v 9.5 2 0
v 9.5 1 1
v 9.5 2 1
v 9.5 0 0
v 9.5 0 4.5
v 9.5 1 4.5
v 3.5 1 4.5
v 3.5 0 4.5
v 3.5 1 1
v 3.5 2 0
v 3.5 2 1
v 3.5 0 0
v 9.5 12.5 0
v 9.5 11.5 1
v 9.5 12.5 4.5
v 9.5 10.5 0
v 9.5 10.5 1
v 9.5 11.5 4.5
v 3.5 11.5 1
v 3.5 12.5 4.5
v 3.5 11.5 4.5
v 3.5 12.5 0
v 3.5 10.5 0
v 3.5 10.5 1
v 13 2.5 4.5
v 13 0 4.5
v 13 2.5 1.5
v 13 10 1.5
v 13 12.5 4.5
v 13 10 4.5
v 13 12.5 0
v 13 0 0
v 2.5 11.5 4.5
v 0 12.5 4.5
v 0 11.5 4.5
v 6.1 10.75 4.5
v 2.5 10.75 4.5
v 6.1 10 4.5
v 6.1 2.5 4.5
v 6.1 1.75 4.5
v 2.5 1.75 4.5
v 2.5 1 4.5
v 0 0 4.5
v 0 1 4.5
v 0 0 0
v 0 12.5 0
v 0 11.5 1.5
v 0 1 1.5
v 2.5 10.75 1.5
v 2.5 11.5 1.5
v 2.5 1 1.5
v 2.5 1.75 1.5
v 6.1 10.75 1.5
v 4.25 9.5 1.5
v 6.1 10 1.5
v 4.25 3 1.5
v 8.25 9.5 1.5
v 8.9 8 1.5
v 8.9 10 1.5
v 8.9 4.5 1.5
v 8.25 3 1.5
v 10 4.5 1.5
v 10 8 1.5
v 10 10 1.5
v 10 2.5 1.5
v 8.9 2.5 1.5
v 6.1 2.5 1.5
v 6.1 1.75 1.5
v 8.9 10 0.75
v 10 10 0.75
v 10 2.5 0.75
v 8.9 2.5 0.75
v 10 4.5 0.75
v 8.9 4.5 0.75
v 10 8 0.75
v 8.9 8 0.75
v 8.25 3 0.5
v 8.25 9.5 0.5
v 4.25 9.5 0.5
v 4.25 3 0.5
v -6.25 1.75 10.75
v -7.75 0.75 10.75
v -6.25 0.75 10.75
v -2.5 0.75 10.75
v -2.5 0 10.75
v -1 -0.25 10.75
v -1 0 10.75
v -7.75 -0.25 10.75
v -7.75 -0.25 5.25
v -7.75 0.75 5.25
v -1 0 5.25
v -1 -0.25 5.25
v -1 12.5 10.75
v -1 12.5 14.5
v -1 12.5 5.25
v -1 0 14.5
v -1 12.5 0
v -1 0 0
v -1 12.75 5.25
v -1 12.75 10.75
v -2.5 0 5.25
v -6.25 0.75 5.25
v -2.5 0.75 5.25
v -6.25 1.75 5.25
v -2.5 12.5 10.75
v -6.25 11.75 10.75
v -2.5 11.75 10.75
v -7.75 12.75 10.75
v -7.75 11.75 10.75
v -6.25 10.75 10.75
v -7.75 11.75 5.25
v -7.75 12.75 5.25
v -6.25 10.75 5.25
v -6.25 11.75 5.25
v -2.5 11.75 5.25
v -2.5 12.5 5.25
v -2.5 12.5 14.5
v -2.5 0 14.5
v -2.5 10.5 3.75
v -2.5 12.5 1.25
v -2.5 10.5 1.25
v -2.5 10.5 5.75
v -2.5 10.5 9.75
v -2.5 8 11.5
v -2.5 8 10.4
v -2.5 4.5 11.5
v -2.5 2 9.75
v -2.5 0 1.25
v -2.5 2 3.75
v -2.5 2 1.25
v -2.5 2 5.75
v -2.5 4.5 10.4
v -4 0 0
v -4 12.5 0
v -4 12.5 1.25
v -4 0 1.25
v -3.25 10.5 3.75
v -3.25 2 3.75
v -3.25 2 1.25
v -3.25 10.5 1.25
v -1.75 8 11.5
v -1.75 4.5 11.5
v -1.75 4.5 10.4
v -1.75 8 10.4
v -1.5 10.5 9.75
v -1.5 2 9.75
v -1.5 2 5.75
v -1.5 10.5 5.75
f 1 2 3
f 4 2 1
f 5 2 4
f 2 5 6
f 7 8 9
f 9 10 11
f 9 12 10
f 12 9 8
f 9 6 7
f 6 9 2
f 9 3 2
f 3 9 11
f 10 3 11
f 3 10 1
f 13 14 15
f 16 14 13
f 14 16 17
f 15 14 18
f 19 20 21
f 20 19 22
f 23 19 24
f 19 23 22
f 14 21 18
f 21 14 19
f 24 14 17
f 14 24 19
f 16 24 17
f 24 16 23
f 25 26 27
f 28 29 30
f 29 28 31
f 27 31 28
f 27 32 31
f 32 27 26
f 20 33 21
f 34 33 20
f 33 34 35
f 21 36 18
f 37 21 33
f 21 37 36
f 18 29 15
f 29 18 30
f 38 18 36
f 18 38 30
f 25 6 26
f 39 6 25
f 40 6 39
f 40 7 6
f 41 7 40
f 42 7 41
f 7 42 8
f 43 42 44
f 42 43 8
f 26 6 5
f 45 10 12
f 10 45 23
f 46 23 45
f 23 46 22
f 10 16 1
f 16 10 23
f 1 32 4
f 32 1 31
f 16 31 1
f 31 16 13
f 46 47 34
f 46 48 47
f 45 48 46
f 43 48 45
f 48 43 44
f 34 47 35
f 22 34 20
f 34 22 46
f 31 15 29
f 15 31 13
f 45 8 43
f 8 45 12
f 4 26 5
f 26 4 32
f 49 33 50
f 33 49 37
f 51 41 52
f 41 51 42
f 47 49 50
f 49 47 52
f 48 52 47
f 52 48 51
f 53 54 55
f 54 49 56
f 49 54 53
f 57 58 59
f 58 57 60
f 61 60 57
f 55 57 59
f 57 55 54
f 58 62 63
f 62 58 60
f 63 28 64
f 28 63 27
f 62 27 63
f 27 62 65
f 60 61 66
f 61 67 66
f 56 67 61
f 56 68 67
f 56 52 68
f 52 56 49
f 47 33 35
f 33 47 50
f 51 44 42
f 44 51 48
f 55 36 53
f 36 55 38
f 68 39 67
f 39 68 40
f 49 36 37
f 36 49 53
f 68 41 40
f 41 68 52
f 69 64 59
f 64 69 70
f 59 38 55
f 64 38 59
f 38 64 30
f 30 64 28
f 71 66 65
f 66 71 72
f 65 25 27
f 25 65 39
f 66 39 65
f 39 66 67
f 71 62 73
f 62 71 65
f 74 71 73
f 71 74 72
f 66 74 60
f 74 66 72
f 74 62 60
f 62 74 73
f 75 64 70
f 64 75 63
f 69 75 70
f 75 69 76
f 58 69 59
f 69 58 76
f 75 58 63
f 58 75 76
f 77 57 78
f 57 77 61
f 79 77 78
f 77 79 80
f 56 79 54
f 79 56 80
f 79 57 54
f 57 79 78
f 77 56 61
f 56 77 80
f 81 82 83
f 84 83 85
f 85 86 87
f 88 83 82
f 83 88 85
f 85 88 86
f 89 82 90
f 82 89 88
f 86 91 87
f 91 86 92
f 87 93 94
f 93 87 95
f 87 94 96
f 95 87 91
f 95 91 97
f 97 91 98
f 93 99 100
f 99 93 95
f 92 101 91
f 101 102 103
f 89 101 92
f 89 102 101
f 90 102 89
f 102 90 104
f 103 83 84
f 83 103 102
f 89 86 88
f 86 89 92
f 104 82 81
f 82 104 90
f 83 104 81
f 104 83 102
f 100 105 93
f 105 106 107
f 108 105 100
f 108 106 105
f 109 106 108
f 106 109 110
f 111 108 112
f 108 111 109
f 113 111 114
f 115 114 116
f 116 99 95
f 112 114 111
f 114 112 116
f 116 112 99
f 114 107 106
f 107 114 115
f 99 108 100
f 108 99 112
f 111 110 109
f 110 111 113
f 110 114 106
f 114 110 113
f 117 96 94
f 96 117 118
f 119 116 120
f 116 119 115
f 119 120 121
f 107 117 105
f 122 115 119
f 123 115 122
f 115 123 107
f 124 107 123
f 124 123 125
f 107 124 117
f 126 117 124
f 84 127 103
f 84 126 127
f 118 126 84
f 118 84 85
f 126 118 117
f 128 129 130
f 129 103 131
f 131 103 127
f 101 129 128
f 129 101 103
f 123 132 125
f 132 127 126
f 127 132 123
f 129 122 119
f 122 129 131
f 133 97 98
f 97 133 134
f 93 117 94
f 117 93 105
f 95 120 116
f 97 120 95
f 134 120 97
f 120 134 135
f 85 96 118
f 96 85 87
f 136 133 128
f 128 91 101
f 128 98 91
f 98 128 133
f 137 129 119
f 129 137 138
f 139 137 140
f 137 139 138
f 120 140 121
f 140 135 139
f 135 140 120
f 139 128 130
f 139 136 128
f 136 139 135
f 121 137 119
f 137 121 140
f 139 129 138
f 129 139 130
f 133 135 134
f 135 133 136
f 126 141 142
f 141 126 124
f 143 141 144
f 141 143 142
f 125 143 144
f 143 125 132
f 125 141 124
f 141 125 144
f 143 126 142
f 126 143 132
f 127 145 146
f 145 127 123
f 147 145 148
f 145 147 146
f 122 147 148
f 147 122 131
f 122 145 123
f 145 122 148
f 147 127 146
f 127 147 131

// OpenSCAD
bottom();
// translate([0,0,6.1]) mirror([0,0,1]) top();

// top();

translate([-1,0,1.5]) rotate([0,-90,0]) top();

module bottom() {
  difference() {
    cube([13,12.5,4.5]);
    translate([-0.1,1,1.5]) cube([2.6,10.5,3.1]);
    translate([2.4,1.75,1.5]) cube([3.7,9,3.1]);
    translate([6,2.5,1.5]) cube([10,7.5,3.1]);
    translate([8.9,2.5,0.75]) cube([1.1,2,0.76]);
    translate([8.9,8,0.75]) cube([1.1,2,0.76]);
    translate([4.25,3,0.5]) cube([4,6.5,1.76]);

    translate([3.5,-0.1,-0.1]) {
      cube([6,1.1,5]);
      cube([6,2.1,1.1]);
    }
    translate([3.5,12.6,-0.1]) mirror([0,1,0]) {
      cube([6,1.1,5]);
      cube([6,2.1,1.1]);
    }
  }
}

module top() {
  difference() {
    translate([-1.5,0,0]) {
      cube([14.5,12.5,1.5]);
      translate([1.25,2,0]) cube([2.5,8.5,2.25]);
      cube([1.25,12.5,3]);
      translate([5.25,0,0]) clip();
      translate([5.25,12.5,0]) mirror([0,1,0]) clip();
    }
    translate([8.9,4.5,0.75]) cube([1.1,3.5,0.76]);
    translate([4.25,2,0.5]) cube([4,8.5,1.76]);
  }
}

module clip() {
  translate([0,-0.25,0]) cube([5.5,1,6.75]);
  translate([5.5,0.75,5.25]) rotate([0,-90,0]) linear_extrude(height = 5.5 ) polygon(points=[[0,0],[1.5,0],[0,1]]);
}
